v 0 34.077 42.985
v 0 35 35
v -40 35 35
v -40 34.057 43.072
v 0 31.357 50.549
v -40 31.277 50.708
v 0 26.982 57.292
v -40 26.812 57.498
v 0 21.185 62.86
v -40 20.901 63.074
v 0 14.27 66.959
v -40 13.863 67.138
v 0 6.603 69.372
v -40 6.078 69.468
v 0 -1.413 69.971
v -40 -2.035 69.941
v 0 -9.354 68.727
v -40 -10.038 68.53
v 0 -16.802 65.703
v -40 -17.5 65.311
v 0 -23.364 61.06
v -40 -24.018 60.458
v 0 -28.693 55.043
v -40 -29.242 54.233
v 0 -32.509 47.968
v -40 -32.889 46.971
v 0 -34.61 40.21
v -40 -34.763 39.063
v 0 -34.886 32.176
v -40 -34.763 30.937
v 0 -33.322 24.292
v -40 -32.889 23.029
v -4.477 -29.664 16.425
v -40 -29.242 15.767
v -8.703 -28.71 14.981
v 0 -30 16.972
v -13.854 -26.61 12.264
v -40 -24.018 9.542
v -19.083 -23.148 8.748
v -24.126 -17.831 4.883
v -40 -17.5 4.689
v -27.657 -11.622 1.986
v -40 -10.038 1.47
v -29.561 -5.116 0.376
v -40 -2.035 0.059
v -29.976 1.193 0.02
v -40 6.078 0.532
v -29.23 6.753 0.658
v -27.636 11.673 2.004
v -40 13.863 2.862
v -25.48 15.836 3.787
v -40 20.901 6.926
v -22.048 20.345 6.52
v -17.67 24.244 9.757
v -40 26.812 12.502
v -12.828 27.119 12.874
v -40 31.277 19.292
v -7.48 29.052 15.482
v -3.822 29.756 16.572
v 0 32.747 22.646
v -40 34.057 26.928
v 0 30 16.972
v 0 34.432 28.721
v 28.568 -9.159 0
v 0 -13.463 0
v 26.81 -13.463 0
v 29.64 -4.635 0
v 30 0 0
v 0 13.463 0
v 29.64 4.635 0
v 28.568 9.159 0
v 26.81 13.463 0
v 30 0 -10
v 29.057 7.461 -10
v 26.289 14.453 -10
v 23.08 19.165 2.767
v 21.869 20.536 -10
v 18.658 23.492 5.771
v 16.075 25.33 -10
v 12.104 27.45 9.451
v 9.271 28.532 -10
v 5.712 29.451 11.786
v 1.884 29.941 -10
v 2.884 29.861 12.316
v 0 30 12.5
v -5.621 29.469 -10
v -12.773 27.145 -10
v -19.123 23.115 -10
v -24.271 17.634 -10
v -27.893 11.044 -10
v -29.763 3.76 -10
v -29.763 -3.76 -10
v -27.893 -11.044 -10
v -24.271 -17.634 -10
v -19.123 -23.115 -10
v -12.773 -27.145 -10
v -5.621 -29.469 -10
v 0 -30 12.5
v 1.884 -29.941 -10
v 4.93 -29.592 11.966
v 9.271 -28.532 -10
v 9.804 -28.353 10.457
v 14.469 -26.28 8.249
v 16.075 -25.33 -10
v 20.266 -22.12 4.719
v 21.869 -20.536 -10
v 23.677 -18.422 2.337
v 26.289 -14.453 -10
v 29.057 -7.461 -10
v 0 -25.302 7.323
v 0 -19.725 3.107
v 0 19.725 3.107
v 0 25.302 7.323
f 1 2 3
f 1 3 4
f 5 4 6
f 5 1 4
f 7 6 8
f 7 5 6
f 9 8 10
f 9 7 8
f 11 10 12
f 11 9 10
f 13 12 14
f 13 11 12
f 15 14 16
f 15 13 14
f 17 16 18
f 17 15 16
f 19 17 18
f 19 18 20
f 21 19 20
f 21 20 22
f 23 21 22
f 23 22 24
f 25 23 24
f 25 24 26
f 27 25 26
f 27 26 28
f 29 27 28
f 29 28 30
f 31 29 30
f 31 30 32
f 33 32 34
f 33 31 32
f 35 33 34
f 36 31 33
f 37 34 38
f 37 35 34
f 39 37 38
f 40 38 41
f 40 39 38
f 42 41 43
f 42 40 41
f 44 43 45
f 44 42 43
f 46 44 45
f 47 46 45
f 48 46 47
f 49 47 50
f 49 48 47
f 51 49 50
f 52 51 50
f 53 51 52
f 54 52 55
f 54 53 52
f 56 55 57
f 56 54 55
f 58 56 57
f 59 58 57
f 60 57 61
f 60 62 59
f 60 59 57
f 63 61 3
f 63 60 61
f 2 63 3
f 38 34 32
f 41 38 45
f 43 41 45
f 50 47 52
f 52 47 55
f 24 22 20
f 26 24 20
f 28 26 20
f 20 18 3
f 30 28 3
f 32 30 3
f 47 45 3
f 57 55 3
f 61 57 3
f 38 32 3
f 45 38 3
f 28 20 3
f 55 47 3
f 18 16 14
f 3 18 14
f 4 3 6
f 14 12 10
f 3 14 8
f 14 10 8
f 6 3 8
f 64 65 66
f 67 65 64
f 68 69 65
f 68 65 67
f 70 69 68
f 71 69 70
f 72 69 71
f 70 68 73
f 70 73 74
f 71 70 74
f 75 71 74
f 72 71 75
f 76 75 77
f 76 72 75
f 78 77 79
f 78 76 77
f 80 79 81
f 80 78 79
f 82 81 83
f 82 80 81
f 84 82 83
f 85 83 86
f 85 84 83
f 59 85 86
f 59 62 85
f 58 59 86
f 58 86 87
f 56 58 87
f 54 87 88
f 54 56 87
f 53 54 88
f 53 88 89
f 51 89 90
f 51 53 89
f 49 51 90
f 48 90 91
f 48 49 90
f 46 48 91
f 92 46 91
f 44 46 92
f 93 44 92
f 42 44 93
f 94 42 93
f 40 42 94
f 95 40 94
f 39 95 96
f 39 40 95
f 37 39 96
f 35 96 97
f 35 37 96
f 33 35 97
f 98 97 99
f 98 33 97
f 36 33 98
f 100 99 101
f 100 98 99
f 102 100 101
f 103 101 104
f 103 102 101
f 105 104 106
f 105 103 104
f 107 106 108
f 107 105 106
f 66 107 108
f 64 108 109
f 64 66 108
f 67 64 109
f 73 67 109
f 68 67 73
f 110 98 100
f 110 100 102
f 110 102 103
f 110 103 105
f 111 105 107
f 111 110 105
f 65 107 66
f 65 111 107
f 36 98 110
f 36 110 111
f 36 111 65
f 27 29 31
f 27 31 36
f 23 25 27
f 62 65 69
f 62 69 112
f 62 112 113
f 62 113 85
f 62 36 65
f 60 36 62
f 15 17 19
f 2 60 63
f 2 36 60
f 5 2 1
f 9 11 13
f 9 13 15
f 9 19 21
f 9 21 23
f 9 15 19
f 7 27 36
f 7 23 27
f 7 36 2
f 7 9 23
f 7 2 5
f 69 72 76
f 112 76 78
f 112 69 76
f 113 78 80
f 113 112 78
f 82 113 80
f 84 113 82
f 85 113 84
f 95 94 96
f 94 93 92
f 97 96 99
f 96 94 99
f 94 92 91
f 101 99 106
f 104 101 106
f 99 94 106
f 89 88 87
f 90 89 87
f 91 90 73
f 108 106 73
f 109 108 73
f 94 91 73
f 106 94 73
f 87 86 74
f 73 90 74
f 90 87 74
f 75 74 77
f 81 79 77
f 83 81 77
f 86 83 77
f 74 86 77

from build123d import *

# Parameters (mm, degrees)
SKETCH_R     = 30
PAD_DEPTH    = 30
SKETCH001_R  = 35
PAD001_DEPTH = 40
SKETCH002_R  = 37.5
POCKET_DEPTH = 35
PAD002_DEPTH = 10


with BuildPart() as part:
    # Sketch → Pad (new body)
    with BuildSketch(Plane.XY):
        Circle(SKETCH_R)
    extrude(amount=PAD_DEPTH)

    # Sketch001 → Pad001 (join)
    with BuildSketch(Plane.YZ):
        with Locations((0, 35)):
            Circle(SKETCH001_R)
    extrude(amount=-PAD001_DEPTH)

    # Sketch002 → Pocket (cut)
    with BuildSketch(Plane.YZ):
        with Locations((0, 35)):
            Circle(SKETCH002_R)
    extrude(amount=POCKET_DEPTH, mode=Mode.SUBTRACT)

    # Sketch → Pad002 (join)
    with BuildSketch(Plane.XY):
        Circle(SKETCH_R)
    extrude(amount=-PAD002_DEPTH)


solid = part.part
